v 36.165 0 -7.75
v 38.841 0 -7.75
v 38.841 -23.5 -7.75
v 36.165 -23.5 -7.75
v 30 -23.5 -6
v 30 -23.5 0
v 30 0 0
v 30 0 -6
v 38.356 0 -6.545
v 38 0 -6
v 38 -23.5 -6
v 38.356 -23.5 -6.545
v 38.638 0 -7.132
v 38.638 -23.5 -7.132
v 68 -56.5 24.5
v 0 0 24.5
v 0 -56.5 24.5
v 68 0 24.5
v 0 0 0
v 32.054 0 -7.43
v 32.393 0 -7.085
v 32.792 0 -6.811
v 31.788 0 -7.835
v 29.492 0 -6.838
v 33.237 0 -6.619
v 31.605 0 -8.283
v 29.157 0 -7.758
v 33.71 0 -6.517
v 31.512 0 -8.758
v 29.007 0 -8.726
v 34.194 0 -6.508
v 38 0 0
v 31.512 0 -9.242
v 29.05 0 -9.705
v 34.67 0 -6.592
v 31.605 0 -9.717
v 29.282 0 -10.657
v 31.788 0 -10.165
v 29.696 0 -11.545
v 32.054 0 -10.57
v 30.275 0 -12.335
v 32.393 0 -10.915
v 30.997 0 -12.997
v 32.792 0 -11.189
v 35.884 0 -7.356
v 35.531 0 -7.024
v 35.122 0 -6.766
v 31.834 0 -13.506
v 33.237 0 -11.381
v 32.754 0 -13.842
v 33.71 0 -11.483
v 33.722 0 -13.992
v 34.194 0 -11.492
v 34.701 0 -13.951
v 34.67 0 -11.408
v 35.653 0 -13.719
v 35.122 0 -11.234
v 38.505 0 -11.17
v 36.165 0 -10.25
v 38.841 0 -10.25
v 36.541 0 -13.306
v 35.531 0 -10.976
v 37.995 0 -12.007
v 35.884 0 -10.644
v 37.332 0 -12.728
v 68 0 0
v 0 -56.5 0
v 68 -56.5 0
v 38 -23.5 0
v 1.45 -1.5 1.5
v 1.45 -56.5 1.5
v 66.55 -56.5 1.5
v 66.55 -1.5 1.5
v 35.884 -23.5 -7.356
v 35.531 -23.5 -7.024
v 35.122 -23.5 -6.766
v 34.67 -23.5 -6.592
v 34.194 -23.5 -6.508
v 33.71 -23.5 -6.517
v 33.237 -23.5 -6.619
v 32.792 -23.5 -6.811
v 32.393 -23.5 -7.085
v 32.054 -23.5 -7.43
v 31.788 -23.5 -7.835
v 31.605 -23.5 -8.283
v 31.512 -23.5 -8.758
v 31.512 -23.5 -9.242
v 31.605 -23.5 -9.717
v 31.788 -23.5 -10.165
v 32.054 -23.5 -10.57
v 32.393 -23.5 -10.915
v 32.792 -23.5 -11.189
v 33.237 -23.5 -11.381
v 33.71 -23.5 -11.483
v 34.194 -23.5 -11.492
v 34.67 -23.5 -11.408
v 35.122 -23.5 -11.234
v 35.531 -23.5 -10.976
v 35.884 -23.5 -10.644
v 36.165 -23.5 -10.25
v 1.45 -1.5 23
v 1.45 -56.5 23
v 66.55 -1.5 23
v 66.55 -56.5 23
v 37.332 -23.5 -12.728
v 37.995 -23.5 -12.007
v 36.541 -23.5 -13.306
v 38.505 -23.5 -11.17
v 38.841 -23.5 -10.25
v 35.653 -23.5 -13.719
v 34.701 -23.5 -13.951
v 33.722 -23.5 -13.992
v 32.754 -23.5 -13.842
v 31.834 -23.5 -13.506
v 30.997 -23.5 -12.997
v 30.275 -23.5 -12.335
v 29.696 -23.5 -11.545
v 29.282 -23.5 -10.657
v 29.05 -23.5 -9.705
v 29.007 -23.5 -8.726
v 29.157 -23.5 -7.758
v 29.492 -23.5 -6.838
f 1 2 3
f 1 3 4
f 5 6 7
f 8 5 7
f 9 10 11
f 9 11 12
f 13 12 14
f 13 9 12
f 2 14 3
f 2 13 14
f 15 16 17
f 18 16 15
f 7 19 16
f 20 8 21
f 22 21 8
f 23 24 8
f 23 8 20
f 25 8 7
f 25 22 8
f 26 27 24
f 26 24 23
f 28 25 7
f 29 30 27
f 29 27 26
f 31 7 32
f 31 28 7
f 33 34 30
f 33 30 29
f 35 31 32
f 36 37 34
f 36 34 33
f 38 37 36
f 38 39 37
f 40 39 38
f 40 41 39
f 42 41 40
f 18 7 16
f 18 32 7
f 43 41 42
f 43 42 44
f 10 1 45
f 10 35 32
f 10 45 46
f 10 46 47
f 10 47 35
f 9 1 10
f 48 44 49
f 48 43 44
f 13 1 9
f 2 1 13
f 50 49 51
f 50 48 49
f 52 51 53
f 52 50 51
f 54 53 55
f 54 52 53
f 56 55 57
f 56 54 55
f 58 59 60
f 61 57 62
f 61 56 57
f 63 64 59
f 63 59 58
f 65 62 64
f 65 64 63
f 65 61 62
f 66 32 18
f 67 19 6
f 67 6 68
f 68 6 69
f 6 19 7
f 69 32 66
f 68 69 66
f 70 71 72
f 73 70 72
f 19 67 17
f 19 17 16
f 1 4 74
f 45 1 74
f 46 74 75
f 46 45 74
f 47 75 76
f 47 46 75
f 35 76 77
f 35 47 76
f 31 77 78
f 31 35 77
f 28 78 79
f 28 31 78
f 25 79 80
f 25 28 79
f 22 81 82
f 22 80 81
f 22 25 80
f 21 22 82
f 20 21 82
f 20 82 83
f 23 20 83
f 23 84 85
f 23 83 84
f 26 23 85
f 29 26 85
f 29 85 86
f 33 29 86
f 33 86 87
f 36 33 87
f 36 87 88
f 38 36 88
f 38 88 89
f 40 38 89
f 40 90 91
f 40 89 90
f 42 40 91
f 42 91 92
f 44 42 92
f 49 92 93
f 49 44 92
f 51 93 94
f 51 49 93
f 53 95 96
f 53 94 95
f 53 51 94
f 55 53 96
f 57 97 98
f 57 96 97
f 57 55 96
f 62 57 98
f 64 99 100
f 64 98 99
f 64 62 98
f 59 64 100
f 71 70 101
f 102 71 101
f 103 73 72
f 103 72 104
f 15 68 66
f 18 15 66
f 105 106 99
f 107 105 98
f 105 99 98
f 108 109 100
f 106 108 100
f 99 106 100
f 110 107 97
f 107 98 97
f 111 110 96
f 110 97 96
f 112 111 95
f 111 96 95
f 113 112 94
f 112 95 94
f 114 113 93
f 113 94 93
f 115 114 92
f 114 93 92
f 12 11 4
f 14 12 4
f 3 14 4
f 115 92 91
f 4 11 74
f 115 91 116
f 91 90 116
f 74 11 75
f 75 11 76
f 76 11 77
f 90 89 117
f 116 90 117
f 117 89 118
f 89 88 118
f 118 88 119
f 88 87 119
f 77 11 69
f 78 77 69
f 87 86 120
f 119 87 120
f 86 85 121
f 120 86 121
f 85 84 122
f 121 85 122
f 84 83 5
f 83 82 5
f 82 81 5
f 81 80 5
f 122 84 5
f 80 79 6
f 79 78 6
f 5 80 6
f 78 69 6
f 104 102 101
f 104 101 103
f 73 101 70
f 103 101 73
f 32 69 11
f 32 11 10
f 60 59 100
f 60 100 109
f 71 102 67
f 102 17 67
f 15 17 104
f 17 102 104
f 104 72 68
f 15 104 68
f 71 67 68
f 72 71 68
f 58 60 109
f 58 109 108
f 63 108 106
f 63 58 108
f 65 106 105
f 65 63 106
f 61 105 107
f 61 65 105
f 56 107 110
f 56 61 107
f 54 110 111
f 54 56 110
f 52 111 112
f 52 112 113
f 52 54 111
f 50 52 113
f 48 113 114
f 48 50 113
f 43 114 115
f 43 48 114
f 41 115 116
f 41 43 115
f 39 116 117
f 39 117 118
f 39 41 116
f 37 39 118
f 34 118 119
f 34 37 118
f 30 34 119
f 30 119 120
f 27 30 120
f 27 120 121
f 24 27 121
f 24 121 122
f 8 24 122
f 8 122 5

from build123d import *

# Parameters (mm, degrees)
SKETCH_1_W          = 68
SKETCH_1_H          = 56.5
EXTRUDE_1_DEPTH     = 24.5
SKETCH_4_W          = 65.1
SKETCH_4_H          = 21.5
CUT_EXTRUDE_2_DEPTH = 55
SKETCH_6_W          = 8
SKETCH_6_H          = 56.5
EXTRUDE_3_DEPTH     = 6
EXTRUDE_4_DEPTH     = 56.5
SKETCH_9_W          = 19
SKETCH_9_H          = 33
CUT_EXTRUDE_3_DEPTH = 15


with BuildPart() as part:
    # 草图1 → 凸台-拉伸1 (new body)
    with BuildSketch(Plane.XY):
        with Locations((34, -28.25)):
            Rectangle(SKETCH_1_W, SKETCH_1_H)
    extrude(amount=EXTRUDE_1_DEPTH)

    # 草图4 → 切除-拉伸2 (cut)
    with BuildSketch(Plane.XZ.offset(56.5)):
        with Locations((34, 12.25)):
            Rectangle(SKETCH_4_W, SKETCH_4_H)
    extrude(amount=-CUT_EXTRUDE_2_DEPTH, mode=Mode.SUBTRACT)

    # 草图6 → 凸台-拉伸3 (add)
    with BuildSketch(Plane(origin=(0, 0, 0), x_dir=(-1, 0, 0), z_dir=(0, 0, -1))):
        with Locations((-34, -28.25)):
            Rectangle(SKETCH_6_W, SKETCH_6_H)
    extrude(amount=EXTRUDE_3_DEPTH)

    # 草图8 → 凸台-拉伸4 (add)
    with BuildSketch(Plane(origin=(0, 0, 0), x_dir=(1, 0, 0), z_dir=(0, 1, 0))):
        with BuildLine():
            Line((34, 6), (38, 6))
            ThreePointArc((38, 6), (38.50637974, 6.833772488), (38.841229183, 7.75))
            Line((38.841229183, 7.75), (36.165055224, 7.75))
            ThreePointArc((36.165055224, 7.75), (31.500007176, 9), (36.165055224, 10.25))
            Line((36.165055224, 10.25), (38.841229183, 10.25))
            ThreePointArc((38.841229183, 10.25), (31.833772488, 13.50637974), (30, 6))
            Line((30, 6), (34, 6))
        make_face()
    extrude(amount=-EXTRUDE_4_DEPTH)

    # 草图9 → 切除-拉伸3 (cut)
    with BuildSketch(Plane(origin=(0, 0, 0), x_dir=(-1, 0, 0), z_dir=(0, 0, -1))):
        with Locations((-33.897010853, -40)):
            Rectangle(SKETCH_9_W, SKETCH_9_H)
    extrude(amount=CUT_EXTRUDE_3_DEPTH, mode=Mode.SUBTRACT)


solid = part.part
